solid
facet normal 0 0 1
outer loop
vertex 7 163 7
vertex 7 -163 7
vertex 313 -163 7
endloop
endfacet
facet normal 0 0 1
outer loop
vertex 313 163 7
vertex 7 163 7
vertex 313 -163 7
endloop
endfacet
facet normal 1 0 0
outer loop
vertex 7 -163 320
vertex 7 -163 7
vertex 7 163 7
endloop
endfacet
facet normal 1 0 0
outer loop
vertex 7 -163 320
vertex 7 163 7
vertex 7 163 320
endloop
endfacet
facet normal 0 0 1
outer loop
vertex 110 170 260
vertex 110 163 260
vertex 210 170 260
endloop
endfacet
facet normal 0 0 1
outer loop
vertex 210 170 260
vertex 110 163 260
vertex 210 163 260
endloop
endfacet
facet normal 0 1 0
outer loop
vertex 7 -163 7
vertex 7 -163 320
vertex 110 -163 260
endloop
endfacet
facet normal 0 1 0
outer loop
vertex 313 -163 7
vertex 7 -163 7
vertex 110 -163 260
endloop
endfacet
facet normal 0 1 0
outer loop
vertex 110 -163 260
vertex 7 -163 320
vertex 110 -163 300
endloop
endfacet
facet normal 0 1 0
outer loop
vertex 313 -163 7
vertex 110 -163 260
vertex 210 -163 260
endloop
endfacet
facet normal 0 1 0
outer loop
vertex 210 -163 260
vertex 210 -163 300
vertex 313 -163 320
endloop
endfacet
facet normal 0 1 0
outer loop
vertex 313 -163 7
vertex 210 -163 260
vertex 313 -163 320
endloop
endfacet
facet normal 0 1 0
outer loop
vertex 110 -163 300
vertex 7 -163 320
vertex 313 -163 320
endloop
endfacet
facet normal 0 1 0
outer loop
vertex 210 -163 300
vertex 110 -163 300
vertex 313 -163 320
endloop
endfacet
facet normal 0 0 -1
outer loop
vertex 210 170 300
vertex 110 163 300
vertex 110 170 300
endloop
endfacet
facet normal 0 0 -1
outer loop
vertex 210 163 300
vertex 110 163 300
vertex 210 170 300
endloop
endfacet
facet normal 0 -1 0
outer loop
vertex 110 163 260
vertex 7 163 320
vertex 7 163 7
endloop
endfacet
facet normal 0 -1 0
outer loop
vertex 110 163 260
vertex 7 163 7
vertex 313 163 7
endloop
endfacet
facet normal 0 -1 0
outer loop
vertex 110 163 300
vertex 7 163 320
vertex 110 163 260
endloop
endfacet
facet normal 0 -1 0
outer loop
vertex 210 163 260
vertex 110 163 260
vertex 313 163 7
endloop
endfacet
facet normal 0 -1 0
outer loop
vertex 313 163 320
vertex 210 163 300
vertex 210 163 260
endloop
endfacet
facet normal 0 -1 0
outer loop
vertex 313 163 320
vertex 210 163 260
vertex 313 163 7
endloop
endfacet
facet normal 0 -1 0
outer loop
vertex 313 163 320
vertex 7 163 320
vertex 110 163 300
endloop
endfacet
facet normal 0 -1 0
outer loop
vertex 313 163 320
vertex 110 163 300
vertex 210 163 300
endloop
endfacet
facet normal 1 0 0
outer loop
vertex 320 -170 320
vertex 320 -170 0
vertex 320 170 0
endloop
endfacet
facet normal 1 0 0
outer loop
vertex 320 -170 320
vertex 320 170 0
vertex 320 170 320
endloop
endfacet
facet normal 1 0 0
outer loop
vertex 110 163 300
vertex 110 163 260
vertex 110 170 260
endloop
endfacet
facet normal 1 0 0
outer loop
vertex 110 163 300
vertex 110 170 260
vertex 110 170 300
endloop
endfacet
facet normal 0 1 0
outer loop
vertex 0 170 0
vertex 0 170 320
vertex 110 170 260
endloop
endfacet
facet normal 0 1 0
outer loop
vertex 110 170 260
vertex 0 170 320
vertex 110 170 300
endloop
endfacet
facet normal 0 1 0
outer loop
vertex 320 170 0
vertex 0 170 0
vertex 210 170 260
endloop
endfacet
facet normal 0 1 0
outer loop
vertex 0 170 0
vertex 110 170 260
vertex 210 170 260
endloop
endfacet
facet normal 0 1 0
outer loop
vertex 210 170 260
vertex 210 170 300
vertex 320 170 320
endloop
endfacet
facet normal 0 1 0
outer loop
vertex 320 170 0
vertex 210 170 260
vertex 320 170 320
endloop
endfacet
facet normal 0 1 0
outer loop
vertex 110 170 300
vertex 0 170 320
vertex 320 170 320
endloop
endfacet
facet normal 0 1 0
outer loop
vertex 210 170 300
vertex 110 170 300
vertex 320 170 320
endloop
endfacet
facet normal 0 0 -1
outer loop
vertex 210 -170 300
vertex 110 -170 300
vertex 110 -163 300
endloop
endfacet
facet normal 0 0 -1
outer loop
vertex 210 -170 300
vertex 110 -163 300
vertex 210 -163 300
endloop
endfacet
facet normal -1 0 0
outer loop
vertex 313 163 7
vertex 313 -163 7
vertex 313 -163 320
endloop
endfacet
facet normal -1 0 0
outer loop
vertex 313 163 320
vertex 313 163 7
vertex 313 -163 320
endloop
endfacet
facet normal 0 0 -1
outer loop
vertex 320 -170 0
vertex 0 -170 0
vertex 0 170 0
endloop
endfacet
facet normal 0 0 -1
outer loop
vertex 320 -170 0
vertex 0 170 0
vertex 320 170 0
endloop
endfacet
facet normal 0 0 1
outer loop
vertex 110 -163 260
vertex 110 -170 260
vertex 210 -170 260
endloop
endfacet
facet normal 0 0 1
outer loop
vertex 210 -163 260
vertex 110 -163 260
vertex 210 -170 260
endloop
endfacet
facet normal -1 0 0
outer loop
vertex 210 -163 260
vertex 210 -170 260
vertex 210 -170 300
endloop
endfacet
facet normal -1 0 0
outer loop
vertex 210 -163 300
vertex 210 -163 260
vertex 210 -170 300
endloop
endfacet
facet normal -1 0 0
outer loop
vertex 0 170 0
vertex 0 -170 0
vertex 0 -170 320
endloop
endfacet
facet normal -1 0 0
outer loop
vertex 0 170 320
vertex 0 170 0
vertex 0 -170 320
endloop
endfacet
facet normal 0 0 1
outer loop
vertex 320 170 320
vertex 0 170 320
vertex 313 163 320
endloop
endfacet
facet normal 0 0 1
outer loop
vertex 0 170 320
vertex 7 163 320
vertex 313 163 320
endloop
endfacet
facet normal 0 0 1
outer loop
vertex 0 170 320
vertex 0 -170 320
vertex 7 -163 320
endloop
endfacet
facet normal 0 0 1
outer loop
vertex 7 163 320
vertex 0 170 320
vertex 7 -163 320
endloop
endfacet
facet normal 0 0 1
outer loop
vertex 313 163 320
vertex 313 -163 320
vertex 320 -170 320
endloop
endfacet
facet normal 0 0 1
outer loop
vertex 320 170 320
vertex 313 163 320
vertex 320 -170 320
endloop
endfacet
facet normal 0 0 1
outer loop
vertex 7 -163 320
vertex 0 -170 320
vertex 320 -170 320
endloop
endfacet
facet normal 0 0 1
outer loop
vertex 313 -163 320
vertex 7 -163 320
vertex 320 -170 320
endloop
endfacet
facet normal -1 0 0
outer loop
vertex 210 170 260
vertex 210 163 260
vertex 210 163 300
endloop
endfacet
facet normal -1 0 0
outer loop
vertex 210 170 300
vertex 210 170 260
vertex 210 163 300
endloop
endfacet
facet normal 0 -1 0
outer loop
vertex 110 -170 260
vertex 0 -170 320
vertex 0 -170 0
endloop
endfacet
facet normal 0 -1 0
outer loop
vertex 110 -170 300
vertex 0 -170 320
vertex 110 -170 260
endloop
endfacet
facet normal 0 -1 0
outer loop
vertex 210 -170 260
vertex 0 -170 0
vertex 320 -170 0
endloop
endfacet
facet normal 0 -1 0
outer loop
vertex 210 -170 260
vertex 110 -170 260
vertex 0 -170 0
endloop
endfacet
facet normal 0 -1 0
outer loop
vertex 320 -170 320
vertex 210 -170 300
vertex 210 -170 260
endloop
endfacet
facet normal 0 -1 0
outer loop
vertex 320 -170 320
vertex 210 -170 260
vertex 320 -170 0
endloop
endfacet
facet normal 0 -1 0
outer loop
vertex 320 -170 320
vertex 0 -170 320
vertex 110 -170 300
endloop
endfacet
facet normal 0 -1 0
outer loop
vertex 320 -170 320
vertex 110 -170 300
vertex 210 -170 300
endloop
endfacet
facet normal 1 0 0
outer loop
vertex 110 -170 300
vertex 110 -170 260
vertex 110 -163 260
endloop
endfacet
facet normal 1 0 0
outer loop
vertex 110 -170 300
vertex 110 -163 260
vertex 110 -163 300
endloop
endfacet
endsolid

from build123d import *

# Parameters (mm, degrees)
F0_W     = 320
F0_H     = 320
F1_DEPTH = 170
F2_T     = -7
F3_W     = 100
F3_H     = 40
F4_DEPTH = 340.001


with BuildPart() as f1:
    # F0 (on Front) → F1 (new body, symmetric)
    with BuildSketch(Plane.XZ):
        with Locations((160, 160)):
            Rectangle(F0_W, F0_H)
    extrude(amount=F1_DEPTH, both=True)

    # F2
    f2_openings = [f1.faces().sort_by_distance(p)[0] for p in [
        (160, 0, 320),
    ]]
    offset(amount=F2_T, openings=f2_openings)

    # F3 (on face) → F4 (cut, through all)
    with BuildSketch(Plane.XZ.offset(170)):
        with Locations((160, 280)):
            Rectangle(F3_W, F3_H)
    extrude(amount=-F4_DEPTH, mode=Mode.SUBTRACT)


solid = f1.part
